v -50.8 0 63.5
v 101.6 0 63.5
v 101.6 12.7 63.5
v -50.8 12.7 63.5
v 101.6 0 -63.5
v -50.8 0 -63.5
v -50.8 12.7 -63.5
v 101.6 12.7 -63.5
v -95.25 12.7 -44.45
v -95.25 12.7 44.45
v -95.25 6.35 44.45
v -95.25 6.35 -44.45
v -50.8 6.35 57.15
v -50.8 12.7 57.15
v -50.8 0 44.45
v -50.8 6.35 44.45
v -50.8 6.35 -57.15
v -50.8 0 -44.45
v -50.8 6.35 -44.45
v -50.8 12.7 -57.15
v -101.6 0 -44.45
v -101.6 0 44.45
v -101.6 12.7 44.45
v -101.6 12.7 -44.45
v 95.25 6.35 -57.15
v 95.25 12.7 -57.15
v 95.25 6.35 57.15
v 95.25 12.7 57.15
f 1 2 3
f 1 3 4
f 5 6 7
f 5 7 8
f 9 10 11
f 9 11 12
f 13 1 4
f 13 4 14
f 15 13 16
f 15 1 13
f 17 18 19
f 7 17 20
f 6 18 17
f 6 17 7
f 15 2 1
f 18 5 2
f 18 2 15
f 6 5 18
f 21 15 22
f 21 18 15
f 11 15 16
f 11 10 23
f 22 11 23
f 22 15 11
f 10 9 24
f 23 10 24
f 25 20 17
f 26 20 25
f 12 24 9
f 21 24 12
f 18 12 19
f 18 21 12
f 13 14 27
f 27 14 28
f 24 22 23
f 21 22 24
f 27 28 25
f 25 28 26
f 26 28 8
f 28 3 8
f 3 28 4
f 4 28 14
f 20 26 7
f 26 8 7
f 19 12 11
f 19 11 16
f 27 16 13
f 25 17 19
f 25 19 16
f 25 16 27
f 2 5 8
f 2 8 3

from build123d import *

# Parameters (mm, degrees)
BOSS_EXTRUDE1_DEPTH = 12.7
SKETCH2_W           = 190.5
SKETCH2_H           = 114.3
CUT_EXTRUDE1_DEPTH  = 6.35


with BuildPart() as part:
    # Sketch1 → Boss-Extrude1 (new body)
    with BuildSketch(Plane(origin=(0, 0, 0), x_dir=(1, 0, 0), z_dir=(0, 1, 0))):
        Polygon((-101.6, 44.45), (-50.8, 44.45), (-50.8, 63.5), (101.6, 63.5), (101.6, -63.5), (-50.8, -63.5), (-50.8, -44.45), (-101.6, -44.45), align=None)
    extrude(amount=BOSS_EXTRUDE1_DEPTH)

    # Sketch2 → Cut-Extrude1 (cut)
    with BuildSketch(Plane(origin=(0, 12.7, 0), x_dir=(1, 0, 0), z_dir=(0, 1, 0))):
        Rectangle(SKETCH2_W, SKETCH2_H)
    extrude(amount=-CUT_EXTRUDE1_DEPTH, mode=Mode.SUBTRACT)


solid = part.part
